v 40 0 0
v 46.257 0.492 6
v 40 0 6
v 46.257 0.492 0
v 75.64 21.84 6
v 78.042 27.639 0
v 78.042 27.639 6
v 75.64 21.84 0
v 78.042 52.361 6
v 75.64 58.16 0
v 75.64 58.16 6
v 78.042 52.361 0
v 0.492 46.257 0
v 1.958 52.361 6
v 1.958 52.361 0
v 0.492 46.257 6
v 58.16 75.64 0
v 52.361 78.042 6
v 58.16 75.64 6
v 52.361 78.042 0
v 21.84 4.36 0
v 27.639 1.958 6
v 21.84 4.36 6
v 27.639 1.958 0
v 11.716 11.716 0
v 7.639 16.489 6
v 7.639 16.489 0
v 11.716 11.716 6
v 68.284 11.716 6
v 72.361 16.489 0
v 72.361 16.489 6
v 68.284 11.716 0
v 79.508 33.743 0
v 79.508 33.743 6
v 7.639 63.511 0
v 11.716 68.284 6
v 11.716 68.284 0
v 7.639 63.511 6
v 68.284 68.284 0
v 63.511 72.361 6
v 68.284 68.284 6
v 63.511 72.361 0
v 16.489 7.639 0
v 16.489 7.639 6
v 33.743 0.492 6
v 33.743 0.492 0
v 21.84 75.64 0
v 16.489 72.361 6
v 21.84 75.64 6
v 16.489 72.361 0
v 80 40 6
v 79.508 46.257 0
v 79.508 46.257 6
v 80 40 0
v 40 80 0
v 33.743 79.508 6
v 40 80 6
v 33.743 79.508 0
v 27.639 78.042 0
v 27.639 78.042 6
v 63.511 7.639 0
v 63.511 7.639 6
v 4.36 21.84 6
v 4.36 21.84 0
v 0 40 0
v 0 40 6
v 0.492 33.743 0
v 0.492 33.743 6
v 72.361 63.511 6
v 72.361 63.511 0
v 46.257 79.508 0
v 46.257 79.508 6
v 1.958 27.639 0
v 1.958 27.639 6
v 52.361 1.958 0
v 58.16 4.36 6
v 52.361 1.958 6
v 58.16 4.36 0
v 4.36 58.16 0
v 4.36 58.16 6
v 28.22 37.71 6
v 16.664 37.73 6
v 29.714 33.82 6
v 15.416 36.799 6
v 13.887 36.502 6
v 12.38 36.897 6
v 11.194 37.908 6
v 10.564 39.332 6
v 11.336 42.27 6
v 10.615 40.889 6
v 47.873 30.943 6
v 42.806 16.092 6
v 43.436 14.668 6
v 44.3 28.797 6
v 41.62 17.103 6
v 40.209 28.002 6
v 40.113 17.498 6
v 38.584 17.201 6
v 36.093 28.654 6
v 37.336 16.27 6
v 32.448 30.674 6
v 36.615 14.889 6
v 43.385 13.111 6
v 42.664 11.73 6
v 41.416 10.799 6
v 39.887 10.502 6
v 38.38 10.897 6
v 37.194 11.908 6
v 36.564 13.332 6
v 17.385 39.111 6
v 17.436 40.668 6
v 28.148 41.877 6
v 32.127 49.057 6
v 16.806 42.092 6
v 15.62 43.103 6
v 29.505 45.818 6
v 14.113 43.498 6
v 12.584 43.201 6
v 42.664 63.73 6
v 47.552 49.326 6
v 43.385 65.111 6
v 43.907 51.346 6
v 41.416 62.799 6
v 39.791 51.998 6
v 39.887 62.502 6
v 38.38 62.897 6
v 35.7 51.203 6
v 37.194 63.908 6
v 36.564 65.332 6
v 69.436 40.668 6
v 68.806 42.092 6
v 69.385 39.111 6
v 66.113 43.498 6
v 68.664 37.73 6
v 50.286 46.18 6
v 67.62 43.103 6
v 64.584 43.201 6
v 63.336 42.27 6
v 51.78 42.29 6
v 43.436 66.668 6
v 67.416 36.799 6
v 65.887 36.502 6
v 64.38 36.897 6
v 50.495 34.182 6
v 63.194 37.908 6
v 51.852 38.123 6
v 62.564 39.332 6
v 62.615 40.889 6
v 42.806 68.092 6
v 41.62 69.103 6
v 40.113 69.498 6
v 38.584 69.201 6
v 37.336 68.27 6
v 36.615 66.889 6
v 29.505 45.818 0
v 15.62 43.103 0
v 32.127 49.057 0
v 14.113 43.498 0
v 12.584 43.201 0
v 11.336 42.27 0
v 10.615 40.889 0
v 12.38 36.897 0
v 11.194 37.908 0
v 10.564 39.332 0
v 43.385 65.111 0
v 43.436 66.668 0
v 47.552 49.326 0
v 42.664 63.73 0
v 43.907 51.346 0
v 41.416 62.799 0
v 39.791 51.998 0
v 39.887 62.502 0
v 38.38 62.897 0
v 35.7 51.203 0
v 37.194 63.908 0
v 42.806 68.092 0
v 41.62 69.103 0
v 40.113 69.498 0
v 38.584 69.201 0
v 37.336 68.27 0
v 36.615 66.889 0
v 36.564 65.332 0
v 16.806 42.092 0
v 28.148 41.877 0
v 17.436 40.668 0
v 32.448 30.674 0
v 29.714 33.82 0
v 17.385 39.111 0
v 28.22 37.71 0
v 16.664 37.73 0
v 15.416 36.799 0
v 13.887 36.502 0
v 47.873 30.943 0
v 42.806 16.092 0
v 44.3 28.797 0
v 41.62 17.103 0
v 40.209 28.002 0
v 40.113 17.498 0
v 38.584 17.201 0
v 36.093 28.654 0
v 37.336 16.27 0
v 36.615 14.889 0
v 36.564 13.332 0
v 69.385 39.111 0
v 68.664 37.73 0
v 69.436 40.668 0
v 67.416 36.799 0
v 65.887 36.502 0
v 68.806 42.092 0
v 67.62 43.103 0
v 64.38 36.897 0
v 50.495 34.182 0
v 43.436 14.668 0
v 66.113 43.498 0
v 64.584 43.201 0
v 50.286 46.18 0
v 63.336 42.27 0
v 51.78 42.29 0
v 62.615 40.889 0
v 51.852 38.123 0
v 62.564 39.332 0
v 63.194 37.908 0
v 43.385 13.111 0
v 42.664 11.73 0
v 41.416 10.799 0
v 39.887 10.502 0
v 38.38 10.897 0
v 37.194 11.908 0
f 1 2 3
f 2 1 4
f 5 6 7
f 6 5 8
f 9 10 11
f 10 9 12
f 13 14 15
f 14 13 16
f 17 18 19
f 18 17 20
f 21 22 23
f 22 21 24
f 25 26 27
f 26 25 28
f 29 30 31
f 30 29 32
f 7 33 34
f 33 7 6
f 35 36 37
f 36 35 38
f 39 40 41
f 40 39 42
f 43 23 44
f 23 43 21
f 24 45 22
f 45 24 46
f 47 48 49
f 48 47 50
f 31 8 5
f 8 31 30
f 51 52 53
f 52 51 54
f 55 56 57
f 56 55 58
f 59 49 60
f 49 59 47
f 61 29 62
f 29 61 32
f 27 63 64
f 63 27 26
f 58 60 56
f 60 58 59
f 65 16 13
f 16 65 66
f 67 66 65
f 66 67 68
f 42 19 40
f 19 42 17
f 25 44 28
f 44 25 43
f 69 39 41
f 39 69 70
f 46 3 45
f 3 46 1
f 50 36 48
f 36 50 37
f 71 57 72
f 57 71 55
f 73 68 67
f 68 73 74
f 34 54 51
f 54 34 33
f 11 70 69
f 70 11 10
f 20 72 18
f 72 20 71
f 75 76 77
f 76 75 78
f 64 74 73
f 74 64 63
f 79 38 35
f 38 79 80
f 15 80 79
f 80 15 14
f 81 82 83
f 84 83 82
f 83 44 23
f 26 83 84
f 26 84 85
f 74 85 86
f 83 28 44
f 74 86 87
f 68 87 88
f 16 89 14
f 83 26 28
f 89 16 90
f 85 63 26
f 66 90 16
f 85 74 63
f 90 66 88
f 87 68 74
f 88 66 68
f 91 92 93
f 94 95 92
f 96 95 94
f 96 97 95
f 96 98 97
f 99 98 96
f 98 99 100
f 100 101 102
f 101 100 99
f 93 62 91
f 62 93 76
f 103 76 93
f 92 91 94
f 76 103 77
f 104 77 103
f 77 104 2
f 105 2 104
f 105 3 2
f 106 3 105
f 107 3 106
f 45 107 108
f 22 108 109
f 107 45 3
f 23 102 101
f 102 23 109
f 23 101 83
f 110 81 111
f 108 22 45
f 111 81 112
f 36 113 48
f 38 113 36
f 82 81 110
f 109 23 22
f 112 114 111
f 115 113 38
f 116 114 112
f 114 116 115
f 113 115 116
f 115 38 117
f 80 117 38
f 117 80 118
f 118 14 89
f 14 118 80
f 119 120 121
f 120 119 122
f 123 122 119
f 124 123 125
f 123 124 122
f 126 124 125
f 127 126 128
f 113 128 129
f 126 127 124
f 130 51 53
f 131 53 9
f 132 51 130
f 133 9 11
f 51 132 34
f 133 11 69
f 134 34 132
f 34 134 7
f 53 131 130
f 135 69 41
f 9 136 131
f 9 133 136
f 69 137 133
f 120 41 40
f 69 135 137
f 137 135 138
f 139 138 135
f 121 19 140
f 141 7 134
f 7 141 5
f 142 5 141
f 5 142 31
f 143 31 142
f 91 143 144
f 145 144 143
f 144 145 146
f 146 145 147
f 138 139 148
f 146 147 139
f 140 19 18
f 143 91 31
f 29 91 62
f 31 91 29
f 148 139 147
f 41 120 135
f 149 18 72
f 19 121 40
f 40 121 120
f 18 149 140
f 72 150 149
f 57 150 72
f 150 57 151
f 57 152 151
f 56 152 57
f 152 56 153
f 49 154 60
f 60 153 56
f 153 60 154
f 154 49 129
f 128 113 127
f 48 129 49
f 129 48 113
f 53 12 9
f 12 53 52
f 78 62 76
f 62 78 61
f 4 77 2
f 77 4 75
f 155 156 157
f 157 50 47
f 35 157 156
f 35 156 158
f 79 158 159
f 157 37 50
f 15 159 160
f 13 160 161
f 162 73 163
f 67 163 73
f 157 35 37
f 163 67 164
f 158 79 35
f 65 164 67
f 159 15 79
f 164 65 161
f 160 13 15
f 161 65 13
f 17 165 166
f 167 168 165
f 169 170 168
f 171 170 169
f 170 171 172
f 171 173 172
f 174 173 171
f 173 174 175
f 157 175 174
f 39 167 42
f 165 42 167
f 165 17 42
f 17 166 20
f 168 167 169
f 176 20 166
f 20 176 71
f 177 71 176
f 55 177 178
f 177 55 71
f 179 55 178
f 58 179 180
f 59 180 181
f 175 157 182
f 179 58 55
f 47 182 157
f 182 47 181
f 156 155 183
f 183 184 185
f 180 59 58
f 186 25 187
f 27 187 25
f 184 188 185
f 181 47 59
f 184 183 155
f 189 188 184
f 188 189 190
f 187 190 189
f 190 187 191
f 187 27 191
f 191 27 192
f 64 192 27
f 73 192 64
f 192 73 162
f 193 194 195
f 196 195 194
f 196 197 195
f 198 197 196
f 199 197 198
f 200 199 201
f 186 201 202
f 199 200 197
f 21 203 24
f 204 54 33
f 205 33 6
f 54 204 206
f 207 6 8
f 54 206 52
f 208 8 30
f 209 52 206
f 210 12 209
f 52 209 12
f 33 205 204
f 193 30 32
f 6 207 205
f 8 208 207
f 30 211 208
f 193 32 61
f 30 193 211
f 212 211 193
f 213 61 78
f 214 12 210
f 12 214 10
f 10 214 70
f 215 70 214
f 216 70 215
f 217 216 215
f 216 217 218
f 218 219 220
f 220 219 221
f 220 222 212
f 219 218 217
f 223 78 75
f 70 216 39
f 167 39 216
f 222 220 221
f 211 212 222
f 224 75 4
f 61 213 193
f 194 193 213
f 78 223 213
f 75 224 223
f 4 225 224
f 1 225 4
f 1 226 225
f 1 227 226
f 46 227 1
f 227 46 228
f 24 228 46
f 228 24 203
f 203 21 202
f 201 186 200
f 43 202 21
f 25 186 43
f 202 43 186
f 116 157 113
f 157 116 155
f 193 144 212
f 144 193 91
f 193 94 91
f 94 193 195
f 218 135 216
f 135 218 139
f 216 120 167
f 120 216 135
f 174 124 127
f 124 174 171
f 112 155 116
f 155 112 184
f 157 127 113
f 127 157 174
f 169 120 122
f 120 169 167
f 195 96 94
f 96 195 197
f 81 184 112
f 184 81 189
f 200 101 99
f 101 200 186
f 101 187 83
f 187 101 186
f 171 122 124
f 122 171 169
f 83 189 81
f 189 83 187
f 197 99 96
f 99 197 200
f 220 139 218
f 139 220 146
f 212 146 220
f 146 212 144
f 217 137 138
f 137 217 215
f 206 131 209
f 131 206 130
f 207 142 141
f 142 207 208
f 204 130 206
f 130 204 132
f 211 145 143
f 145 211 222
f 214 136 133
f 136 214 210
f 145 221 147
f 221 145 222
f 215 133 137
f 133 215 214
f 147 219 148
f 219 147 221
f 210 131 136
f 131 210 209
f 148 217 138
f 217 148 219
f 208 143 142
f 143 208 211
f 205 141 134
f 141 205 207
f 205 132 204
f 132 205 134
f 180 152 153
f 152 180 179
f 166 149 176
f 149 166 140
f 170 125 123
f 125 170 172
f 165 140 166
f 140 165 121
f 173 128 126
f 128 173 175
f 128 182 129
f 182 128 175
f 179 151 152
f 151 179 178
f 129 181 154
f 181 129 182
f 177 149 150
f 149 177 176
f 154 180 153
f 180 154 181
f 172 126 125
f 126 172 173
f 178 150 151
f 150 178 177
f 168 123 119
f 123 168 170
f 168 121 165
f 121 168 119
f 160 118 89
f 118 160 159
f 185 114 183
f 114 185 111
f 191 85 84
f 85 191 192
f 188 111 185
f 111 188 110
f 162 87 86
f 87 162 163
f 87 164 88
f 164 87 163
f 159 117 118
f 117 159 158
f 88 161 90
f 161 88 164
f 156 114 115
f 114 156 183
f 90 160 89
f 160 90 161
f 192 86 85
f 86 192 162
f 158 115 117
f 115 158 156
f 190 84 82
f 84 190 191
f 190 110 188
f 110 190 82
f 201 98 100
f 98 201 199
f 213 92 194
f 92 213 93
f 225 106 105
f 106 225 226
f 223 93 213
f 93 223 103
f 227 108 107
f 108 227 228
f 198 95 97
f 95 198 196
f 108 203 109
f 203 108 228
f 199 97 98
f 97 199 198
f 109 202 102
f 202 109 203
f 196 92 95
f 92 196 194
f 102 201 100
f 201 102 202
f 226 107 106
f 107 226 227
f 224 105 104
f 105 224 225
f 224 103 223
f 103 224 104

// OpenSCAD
$fn = 32;

// ----------------------------------------------------------------------
// Spacer plate: round flange R40, 4 bolts
// ----------------------------------------------------------------------

// --- parameters (mm) ---
bore_r = 12;              // centre bore radius
bolt_r = 3.5;             // bolt hole radius
plate_t = 6;              // plate thickness, Z (extrusion height)
flange_r = 40;            // flange radius
n_bolt = 4;               // bolt hole count
ring_r = 26;              // bolt circle radius

profile = [[80, 40], [79.508, 46.257], [78.042, 52.361], [75.64, 58.16], [72.361, 63.511], [68.284, 68.284], [63.511, 72.361], [58.16, 75.64], [52.361, 78.042], [46.257, 79.508], [40, 80], [33.743, 79.508], [27.639, 78.042], [21.84, 75.64], [16.489, 72.361], [11.716, 68.284], [7.639, 63.511], [4.36, 58.16], [1.958, 52.361], [0.492, 46.257], [0, 40], [0.492, 33.743], [1.958, 27.639], [4.36, 21.84], [7.639, 16.489], [11.716, 11.716], [16.489, 7.639], [21.84, 4.36], [27.639, 1.958], [33.743, 0.492], [40, 0], [46.257, 0.492], [52.361, 1.958], [58.16, 4.36], [63.511, 7.639], [68.284, 11.716], [72.361, 16.489], [75.64, 21.84], [78.042, 27.639], [79.508, 33.743]];  // primary outline, 40 points, counter clockwise
void_1 = [[51.78, 42.29], [50.286, 46.18], [47.552, 49.326], [43.907, 51.346], [39.791, 51.998], [35.7, 51.203], [32.127, 49.057], [29.505, 45.818], [28.148, 41.877], [28.22, 37.71], [29.714, 33.82], [32.448, 30.674], [36.093, 28.654], [40.209, 28.002], [44.3, 28.797], [47.873, 30.943], [50.495, 34.182], [51.852, 38.123]];  // centre bore, 18 points
void_2 = [[69.436, 40.668], [68.806, 42.092], [67.62, 43.103], [66.113, 43.498], [64.584, 43.201], [63.336, 42.27], [62.615, 40.889], [62.564, 39.332], [63.194, 37.908], [64.38, 36.897], [65.887, 36.502], [67.416, 36.799], [68.664, 37.73], [69.385, 39.111]];  // bolt hole 1, 14 points
void_3 = [[43.436, 66.668], [42.806, 68.092], [41.62, 69.103], [40.113, 69.498], [38.584, 69.201], [37.336, 68.27], [36.615, 66.889], [36.564, 65.332], [37.194, 63.908], [38.38, 62.897], [39.887, 62.502], [41.416, 62.799], [42.664, 63.73], [43.385, 65.111]];  // bolt hole 2, 14 points
void_4 = [[17.436, 40.668], [16.806, 42.092], [15.62, 43.103], [14.113, 43.498], [12.584, 43.201], [11.336, 42.27], [10.615, 40.889], [10.564, 39.332], [11.194, 37.908], [12.38, 36.897], [13.887, 36.502], [15.416, 36.799], [16.664, 37.73], [17.385, 39.111]];  // bolt hole 3, 14 points
void_5 = [[43.436, 14.668], [42.806, 16.092], [41.62, 17.103], [40.113, 17.498], [38.584, 17.201], [37.336, 16.27], [36.615, 14.889], [36.564, 13.332], [37.194, 11.908], [38.38, 10.897], [39.887, 10.502], [41.416, 10.799], [42.664, 11.73], [43.385, 13.111]];  // bolt hole 4, 14 points

// --- the one profile operation ---
difference() {
  linear_extrude(height = plate_t) polygon(points = profile);
  translate([0, 0, -1])
    linear_extrude(height = plate_t + 2) polygon(points = void_1);
  translate([0, 0, -1])
    linear_extrude(height = plate_t + 2) polygon(points = void_2);
  translate([0, 0, -1])
    linear_extrude(height = plate_t + 2) polygon(points = void_3);
  translate([0, 0, -1])
    linear_extrude(height = plate_t + 2) polygon(points = void_4);
  translate([0, 0, -1])
    linear_extrude(height = plate_t + 2) polygon(points = void_5);
}
